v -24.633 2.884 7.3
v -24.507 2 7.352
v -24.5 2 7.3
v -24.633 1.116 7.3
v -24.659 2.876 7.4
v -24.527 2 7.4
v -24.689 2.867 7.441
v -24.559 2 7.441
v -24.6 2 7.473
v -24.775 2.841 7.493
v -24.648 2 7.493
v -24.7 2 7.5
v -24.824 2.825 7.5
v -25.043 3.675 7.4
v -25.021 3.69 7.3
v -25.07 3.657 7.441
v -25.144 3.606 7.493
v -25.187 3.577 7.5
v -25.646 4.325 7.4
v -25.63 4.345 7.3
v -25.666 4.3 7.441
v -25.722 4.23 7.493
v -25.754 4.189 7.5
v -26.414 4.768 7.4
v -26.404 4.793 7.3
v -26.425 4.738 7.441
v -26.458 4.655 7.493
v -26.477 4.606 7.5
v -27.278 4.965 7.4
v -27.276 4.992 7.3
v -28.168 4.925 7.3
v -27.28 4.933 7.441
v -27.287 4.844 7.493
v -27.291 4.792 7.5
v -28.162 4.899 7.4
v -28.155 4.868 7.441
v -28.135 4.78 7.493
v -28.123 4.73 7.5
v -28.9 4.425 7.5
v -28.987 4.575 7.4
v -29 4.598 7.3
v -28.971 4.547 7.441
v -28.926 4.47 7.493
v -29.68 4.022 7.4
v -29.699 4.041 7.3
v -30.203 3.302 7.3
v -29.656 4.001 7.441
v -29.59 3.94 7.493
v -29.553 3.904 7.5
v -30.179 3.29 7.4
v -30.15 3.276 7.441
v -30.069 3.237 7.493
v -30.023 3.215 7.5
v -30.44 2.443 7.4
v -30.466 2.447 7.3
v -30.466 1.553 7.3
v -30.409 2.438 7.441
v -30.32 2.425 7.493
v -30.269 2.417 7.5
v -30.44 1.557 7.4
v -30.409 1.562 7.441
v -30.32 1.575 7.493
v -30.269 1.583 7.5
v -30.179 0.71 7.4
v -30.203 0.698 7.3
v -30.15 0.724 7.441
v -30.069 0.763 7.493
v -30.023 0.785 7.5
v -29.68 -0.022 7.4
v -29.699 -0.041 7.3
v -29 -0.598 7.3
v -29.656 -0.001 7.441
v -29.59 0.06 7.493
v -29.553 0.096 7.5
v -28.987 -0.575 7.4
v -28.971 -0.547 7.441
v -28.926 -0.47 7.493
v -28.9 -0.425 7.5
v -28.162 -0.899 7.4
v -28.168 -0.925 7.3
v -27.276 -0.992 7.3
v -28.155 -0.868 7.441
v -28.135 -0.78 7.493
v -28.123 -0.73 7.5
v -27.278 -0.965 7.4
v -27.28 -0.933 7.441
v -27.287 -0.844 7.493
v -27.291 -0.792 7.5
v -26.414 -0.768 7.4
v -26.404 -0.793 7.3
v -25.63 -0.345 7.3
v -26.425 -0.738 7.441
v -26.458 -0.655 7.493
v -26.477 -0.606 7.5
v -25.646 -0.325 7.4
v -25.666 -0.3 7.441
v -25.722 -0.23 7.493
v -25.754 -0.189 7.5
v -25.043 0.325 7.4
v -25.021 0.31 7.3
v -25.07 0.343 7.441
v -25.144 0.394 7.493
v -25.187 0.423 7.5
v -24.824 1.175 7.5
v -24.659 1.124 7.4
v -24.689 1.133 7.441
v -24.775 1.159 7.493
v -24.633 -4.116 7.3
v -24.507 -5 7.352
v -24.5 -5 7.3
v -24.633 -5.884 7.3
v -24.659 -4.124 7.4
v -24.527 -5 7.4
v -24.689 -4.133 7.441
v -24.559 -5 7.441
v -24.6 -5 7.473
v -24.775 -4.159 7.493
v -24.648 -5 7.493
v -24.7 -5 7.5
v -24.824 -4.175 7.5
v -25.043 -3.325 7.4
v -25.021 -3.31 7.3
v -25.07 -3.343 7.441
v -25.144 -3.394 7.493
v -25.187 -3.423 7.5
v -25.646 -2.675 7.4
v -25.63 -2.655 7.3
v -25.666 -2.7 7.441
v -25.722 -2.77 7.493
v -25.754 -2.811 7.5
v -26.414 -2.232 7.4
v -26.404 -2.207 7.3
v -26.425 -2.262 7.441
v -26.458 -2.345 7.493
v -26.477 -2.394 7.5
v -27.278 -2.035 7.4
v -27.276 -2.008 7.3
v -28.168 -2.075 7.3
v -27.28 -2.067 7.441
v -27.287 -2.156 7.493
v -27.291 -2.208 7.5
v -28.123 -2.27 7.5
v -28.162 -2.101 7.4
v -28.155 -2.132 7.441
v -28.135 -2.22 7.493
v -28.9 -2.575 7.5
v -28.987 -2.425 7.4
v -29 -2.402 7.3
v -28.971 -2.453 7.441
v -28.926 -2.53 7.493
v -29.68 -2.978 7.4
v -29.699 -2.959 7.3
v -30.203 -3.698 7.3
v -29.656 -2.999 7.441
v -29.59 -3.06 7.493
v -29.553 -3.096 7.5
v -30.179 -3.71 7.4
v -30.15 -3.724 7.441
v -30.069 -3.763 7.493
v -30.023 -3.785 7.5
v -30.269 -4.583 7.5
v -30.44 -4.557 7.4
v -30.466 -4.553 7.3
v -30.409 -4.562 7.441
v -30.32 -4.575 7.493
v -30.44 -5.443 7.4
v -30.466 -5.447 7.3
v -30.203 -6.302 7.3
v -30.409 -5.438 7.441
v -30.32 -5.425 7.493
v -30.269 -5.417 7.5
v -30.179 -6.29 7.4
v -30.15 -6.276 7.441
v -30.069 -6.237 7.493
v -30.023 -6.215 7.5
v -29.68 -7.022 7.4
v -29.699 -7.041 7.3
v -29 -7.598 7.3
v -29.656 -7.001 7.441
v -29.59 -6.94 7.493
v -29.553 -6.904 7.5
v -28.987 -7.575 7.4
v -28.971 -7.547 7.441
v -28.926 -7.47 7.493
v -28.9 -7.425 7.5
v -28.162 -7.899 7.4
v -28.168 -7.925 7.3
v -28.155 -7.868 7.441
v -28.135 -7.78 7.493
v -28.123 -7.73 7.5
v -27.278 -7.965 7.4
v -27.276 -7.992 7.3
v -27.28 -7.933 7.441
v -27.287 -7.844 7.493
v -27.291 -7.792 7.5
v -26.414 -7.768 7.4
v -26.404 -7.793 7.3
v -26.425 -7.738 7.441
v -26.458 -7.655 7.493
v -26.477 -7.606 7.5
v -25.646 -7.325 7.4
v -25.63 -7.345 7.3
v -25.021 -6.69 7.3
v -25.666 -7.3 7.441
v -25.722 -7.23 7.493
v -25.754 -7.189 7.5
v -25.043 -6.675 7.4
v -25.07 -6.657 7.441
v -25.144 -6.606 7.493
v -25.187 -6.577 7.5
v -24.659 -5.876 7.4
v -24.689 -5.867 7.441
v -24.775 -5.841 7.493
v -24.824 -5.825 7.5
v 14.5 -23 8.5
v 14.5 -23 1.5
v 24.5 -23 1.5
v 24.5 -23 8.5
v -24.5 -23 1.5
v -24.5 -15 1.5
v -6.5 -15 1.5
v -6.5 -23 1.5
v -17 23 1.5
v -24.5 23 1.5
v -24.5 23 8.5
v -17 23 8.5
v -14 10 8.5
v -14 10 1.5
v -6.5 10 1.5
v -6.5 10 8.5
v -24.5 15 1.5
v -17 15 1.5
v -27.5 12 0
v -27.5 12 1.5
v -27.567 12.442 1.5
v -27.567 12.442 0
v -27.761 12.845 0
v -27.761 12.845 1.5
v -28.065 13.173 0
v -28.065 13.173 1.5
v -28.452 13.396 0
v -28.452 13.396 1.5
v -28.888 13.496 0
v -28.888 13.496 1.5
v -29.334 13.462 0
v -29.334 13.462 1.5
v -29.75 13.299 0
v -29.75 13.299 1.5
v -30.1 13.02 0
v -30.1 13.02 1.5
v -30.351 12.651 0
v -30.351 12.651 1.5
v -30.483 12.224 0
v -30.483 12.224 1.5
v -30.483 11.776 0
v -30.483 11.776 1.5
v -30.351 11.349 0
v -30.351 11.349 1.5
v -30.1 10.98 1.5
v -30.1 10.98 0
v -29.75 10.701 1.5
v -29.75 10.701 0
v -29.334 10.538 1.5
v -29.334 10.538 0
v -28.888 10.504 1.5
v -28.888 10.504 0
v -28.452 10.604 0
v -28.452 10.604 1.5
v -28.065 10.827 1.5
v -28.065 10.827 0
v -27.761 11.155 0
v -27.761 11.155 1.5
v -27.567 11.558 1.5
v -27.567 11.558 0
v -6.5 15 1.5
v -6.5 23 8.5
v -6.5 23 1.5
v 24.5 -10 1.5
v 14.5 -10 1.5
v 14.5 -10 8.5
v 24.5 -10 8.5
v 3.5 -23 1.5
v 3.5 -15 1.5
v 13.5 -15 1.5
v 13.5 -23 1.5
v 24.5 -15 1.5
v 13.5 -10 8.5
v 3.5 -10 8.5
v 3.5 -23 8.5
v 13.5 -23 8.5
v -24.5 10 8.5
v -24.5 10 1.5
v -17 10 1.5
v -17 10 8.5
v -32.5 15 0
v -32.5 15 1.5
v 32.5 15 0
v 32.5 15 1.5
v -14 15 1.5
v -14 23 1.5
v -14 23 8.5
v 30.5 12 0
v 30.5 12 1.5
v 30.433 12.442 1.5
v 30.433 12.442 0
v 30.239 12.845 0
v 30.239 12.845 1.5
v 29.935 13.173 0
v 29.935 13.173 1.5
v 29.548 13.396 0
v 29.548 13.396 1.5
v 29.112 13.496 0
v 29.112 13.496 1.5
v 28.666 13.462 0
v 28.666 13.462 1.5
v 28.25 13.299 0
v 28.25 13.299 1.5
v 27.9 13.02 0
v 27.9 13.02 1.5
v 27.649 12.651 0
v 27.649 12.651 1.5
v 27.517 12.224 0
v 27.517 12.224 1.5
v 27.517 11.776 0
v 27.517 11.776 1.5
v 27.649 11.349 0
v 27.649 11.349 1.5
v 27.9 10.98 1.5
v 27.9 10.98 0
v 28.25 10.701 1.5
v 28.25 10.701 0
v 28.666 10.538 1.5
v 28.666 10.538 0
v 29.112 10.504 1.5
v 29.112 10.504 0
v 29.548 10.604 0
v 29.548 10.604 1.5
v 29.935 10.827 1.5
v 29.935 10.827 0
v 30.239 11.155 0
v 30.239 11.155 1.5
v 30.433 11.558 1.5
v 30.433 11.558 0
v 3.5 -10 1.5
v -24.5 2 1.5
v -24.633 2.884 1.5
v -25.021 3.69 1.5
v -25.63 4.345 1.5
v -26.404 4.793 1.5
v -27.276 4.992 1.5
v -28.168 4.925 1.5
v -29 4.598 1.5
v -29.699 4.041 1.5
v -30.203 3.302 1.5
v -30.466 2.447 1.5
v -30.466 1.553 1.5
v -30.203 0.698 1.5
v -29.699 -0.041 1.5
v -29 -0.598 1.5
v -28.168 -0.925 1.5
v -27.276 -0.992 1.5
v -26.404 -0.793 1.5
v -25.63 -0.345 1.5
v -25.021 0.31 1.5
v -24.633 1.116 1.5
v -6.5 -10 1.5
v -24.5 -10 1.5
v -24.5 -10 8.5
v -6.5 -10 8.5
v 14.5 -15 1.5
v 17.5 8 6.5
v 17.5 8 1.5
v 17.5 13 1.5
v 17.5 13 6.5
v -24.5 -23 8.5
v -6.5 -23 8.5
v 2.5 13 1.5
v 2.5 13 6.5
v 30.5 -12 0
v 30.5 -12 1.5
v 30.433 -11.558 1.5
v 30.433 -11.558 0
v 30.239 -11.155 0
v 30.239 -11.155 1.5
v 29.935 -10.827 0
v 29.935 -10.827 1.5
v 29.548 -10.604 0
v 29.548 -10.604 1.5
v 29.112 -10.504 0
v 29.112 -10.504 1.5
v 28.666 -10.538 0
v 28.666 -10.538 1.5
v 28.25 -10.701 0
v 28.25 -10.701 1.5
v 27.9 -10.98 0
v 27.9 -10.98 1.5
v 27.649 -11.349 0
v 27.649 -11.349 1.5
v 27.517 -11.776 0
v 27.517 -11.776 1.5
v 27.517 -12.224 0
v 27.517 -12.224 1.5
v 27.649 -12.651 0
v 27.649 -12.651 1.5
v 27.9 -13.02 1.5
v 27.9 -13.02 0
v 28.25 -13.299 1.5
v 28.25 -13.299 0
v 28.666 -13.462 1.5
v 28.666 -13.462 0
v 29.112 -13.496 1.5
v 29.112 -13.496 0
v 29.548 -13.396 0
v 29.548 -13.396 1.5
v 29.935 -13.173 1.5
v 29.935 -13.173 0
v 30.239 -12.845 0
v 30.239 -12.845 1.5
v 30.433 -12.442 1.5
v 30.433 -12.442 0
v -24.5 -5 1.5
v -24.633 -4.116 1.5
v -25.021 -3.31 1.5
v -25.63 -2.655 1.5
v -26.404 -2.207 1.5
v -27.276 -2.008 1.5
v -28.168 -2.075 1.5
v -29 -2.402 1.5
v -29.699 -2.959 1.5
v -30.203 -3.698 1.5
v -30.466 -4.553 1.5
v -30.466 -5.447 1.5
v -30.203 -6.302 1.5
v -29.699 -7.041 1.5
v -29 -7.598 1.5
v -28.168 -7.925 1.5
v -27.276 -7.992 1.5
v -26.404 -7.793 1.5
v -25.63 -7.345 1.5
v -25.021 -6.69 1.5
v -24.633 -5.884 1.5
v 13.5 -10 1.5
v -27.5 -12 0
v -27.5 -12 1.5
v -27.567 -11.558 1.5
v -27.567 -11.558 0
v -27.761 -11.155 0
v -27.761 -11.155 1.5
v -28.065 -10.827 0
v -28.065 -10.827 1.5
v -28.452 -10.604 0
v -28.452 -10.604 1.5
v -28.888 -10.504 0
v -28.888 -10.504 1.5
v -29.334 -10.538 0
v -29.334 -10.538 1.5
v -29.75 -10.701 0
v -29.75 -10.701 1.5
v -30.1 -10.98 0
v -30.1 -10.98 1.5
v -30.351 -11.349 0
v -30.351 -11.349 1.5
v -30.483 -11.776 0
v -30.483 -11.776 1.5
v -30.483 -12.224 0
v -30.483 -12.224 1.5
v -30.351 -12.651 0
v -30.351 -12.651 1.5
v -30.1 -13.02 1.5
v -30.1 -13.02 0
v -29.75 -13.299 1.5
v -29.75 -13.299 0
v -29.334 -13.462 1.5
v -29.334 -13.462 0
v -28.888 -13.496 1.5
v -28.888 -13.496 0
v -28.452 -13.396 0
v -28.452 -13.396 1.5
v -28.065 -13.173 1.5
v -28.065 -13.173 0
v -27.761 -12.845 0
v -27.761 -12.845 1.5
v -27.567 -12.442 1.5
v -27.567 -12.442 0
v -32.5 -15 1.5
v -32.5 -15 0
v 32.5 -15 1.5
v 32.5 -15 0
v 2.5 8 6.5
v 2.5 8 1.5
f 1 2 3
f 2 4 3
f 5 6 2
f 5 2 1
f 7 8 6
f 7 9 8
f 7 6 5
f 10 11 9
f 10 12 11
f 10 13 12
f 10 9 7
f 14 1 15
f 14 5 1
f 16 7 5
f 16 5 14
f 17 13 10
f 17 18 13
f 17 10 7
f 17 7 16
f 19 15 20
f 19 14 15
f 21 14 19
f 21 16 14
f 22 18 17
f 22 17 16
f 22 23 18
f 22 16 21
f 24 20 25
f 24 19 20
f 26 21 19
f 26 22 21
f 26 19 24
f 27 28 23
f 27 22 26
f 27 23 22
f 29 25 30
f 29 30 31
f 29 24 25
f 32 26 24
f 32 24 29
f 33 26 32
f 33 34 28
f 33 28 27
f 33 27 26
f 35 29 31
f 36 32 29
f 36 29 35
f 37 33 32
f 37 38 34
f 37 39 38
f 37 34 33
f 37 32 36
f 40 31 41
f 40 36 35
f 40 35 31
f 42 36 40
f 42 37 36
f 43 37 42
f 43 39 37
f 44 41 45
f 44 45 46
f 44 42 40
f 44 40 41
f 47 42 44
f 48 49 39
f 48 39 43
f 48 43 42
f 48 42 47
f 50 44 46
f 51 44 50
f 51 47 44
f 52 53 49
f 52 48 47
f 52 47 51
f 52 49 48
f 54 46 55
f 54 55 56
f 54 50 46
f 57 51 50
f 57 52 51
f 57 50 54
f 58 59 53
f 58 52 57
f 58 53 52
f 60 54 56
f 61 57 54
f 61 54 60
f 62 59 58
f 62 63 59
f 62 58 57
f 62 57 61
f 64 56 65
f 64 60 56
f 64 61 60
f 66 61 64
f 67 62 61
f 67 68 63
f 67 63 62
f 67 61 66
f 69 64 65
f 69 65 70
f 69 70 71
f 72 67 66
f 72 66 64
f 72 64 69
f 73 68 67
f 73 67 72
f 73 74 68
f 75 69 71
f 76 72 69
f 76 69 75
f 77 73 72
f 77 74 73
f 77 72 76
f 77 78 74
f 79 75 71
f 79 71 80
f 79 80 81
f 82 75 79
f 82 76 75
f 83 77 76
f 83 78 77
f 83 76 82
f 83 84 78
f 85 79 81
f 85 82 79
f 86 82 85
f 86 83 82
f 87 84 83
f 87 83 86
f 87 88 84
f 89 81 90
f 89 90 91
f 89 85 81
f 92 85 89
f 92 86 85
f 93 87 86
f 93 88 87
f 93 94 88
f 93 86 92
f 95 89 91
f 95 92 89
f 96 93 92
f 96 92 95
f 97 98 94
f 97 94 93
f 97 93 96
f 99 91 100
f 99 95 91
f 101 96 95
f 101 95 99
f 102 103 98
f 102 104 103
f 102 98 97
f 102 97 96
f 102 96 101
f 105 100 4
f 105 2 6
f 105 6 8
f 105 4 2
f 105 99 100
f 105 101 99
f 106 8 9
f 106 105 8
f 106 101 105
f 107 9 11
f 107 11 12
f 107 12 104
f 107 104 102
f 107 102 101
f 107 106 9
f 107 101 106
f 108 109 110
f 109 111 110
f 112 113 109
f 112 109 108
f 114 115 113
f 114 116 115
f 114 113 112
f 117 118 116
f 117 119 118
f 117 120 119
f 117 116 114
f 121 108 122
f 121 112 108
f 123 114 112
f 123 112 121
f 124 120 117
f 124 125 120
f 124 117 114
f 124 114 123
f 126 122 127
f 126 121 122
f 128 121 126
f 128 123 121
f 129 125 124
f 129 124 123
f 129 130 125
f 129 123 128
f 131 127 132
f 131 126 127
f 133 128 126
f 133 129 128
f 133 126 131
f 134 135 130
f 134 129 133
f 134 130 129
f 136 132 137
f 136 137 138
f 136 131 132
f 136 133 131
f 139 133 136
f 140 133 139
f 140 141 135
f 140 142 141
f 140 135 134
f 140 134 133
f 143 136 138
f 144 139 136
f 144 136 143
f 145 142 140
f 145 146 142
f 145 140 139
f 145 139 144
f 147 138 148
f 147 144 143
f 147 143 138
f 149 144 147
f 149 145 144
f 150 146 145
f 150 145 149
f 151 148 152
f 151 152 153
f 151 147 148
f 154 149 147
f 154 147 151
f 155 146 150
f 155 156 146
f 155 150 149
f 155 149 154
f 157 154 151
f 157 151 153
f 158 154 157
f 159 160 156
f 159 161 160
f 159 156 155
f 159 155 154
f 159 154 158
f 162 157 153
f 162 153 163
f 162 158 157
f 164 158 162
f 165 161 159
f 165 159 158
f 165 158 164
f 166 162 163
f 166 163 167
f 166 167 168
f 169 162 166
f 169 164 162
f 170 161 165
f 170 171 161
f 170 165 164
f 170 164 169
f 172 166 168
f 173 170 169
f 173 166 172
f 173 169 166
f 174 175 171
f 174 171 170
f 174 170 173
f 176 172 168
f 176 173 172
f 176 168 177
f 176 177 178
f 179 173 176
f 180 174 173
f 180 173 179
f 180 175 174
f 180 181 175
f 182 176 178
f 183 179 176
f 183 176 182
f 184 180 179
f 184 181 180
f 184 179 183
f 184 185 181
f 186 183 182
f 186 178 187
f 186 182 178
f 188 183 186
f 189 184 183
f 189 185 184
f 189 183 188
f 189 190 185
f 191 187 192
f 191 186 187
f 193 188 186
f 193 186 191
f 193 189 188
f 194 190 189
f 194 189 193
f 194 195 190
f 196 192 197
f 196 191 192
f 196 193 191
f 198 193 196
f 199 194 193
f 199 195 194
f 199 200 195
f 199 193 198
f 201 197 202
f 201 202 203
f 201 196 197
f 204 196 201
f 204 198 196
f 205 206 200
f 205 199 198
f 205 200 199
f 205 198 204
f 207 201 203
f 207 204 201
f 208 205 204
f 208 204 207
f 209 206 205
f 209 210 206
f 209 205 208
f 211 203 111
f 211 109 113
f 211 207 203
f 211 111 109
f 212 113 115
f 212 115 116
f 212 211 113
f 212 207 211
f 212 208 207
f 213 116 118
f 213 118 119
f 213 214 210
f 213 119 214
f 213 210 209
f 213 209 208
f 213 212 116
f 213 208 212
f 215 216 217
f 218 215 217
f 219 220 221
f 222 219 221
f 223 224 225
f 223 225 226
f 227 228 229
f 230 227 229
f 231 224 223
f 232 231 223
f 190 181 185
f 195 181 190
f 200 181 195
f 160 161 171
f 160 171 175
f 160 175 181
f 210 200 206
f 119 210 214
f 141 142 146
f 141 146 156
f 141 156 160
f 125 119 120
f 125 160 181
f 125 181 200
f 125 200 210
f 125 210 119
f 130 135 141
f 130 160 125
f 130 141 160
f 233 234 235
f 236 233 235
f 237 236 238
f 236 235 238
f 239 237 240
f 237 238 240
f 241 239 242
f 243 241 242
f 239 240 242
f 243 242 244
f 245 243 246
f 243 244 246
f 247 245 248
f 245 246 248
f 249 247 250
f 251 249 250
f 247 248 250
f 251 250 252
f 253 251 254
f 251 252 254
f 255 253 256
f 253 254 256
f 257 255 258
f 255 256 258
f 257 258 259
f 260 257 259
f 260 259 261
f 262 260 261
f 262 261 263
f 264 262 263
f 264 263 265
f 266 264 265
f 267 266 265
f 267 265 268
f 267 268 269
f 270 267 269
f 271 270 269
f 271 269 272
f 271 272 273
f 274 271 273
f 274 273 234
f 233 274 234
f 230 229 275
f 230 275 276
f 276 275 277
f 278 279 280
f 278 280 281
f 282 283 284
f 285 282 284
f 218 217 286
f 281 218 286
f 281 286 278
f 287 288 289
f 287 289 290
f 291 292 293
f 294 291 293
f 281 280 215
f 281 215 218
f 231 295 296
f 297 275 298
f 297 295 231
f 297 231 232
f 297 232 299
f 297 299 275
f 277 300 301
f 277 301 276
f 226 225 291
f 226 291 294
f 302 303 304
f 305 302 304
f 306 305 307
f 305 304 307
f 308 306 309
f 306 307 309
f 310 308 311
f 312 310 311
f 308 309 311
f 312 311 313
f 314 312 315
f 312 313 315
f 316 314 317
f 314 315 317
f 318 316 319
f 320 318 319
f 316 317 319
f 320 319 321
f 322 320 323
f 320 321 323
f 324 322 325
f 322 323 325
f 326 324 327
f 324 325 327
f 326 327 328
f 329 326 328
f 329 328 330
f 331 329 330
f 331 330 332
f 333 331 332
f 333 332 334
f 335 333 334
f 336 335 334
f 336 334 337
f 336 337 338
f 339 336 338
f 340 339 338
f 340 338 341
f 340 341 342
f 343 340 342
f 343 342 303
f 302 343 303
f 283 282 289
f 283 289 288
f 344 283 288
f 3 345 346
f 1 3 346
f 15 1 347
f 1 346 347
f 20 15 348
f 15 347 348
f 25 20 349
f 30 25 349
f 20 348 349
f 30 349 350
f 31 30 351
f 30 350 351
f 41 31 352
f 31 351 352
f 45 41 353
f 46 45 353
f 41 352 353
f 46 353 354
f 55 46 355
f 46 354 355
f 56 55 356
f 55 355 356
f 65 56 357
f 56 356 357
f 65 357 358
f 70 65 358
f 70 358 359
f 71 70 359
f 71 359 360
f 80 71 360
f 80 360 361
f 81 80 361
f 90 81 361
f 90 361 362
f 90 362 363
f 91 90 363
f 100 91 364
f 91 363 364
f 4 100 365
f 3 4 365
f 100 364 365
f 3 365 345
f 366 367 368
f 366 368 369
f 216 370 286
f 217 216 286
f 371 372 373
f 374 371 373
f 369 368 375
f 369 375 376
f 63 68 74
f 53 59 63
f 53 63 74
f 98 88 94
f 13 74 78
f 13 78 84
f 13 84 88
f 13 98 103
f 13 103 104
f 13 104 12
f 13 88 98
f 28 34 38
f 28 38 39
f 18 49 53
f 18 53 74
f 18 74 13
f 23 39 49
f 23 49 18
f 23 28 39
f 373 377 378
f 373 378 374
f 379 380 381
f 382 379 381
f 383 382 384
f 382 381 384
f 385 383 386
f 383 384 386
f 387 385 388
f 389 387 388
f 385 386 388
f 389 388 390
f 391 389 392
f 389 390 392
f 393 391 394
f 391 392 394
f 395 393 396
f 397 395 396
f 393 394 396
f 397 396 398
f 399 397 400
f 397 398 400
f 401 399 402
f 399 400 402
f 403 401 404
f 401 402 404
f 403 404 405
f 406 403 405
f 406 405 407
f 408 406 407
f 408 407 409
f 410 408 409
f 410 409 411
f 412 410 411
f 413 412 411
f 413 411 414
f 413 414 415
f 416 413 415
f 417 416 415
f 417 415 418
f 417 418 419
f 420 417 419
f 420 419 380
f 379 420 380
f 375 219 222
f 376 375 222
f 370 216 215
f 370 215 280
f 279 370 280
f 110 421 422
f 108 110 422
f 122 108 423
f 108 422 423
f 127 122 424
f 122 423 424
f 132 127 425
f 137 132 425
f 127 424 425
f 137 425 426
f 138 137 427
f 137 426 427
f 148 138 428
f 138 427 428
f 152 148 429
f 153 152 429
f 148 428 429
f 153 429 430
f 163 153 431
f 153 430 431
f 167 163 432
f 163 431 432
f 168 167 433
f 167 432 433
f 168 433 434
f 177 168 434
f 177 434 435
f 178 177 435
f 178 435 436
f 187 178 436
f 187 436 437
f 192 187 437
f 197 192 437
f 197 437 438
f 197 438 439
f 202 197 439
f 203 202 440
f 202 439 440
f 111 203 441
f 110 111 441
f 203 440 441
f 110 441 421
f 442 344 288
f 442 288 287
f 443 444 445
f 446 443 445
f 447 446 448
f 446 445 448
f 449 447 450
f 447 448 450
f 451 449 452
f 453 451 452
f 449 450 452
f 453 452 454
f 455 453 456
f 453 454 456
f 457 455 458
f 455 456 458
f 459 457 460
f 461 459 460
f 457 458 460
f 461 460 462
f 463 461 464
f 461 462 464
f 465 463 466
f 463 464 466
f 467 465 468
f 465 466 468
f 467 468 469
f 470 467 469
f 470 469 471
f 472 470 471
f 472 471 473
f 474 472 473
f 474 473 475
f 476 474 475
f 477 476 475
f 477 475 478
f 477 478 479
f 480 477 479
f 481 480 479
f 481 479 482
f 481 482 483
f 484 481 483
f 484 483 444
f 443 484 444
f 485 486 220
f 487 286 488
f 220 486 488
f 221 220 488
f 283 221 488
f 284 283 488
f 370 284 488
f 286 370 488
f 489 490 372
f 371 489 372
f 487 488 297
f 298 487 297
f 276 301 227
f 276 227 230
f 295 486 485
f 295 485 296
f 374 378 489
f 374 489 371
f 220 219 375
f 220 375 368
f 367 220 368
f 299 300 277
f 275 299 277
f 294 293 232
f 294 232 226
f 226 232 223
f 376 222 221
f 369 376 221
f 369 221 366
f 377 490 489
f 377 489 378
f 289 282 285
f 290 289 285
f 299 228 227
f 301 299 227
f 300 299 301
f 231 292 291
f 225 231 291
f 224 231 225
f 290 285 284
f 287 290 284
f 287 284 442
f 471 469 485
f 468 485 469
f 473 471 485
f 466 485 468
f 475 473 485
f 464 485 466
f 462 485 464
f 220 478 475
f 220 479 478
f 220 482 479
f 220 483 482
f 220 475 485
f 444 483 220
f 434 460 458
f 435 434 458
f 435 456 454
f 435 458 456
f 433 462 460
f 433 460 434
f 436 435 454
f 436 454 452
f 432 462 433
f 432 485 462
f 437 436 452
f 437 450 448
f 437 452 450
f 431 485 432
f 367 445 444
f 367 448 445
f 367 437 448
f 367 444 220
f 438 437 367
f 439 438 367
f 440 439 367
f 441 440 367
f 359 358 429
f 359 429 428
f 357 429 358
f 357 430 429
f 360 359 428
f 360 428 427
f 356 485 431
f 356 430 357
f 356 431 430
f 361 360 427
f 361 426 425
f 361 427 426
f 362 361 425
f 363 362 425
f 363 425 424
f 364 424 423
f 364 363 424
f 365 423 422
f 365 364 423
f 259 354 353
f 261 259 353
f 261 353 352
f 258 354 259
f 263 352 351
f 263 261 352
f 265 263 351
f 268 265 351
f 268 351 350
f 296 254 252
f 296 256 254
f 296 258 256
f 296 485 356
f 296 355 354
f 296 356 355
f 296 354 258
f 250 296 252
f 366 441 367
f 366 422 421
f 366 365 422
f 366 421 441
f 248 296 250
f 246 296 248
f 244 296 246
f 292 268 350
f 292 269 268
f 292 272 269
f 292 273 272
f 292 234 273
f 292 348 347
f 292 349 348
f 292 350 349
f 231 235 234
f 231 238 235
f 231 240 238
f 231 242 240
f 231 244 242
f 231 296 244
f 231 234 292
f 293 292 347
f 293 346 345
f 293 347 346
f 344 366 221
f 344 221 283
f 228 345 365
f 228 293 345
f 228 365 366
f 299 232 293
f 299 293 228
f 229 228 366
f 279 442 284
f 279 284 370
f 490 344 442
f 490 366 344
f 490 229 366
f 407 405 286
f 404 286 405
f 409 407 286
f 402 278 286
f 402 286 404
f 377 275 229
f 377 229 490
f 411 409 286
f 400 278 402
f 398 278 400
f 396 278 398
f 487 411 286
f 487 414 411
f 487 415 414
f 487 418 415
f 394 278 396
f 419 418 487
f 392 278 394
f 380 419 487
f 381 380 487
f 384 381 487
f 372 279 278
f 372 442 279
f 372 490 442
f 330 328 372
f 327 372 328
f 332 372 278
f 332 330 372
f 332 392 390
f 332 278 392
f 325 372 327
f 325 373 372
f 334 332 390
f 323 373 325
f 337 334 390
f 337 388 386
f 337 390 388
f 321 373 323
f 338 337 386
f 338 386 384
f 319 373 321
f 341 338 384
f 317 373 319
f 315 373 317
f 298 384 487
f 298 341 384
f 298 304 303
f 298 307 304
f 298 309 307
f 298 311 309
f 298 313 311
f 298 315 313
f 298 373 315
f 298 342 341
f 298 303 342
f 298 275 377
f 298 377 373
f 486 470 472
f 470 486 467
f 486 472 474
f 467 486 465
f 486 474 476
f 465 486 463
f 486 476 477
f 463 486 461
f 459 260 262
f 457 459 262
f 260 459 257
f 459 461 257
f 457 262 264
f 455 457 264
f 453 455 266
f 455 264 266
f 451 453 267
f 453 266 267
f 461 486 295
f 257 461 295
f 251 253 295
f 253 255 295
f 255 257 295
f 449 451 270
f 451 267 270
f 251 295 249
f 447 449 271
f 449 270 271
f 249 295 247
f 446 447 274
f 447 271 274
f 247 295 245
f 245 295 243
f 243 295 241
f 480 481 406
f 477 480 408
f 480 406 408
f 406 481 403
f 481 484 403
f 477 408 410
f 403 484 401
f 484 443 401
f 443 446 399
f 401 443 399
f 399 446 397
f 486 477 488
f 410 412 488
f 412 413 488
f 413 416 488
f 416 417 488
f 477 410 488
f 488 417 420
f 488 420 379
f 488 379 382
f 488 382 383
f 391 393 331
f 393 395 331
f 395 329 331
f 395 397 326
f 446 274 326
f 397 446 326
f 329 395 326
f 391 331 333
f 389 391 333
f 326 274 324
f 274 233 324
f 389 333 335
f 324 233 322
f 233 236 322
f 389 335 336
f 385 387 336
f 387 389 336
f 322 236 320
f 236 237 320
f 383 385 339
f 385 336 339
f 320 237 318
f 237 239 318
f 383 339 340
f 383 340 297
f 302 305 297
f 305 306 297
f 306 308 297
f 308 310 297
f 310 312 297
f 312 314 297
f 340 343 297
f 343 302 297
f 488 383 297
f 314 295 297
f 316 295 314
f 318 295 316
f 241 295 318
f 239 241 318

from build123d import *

# Parameters (mm, degrees)
F0_W      = 65
F0_H      = 30
F1_DEPTH  = 1.5
F2_R      = 1.5
F3_DEPTH  = 1.501
F4_R      = 3
F5_DEPTH  = 6
F6_R      = 0.2
F7_W      = 7.5
F7_H      = 13
F7_W_2    = 18
F7_W_3    = 10
F8_DEPTH  = 7
F9_W      = 15
F9_H      = 5
F10_DEPTH = 5


with BuildPart() as f1:
    # F0 (on Top) → F1 (new body)
    with BuildSketch(Plane.XY):
        Rectangle(F0_W, F0_H)
    extrude(amount=F1_DEPTH)

    # F2 (on face) → F3 (cut, through all)
    with BuildSketch(Plane.XY.offset(1.5)):
        with Locations((-29, 12)):
            Circle(F2_R)
        with Locations((-29, -12)):
            Circle(F2_R)
        with Locations((29, 12)):
            Circle(F2_R)
        with Locations((29, -12)):
            Circle(F2_R)
    extrude(amount=-F3_DEPTH, mode=Mode.SUBTRACT)

    # F4 (on face) → F5 (join)
    with BuildSketch(Plane.XY.offset(1.5)):
        with Locations((-27.5, 2)):
            Circle(F4_R)
        with Locations((-27.5, -5)):
            Circle(F4_R)
    extrude(amount=F5_DEPTH)

    # F6
    f6_edges = [f1.edges().sort_by_distance(p)[0] for p in [
        (-30.5, 2, 7.5),
        (-30.5, -5, 7.5),
    ]]
    fillet(f6_edges, radius=F6_R)

    # F7 (on face) → F8 (join)
    with BuildSketch(Plane.XY.offset(1.5)):
        with Locations((-20.75, 16.5)):
            Rectangle(F7_W, F7_H)
        with Locations((-10.25, 16.5)):
            Rectangle(F7_W, F7_H)
        with Locations((-15.5, -16.5)):
            Rectangle(F7_W_2, F7_H)
        with Locations((19.5, -16.5)):
            Rectangle(F7_W_3, F7_H)
        with Locations((8.5, -16.5)):
            Rectangle(F7_W_3, F7_H)
    extrude(amount=F8_DEPTH)

    # F9 (on face) → F10 (join)
    with BuildSketch(Plane.XY.offset(1.5)):
        with Locations((10, 10.5)):
            Rectangle(F9_W, F9_H)
    extrude(amount=F10_DEPTH)


solid = f1.part
